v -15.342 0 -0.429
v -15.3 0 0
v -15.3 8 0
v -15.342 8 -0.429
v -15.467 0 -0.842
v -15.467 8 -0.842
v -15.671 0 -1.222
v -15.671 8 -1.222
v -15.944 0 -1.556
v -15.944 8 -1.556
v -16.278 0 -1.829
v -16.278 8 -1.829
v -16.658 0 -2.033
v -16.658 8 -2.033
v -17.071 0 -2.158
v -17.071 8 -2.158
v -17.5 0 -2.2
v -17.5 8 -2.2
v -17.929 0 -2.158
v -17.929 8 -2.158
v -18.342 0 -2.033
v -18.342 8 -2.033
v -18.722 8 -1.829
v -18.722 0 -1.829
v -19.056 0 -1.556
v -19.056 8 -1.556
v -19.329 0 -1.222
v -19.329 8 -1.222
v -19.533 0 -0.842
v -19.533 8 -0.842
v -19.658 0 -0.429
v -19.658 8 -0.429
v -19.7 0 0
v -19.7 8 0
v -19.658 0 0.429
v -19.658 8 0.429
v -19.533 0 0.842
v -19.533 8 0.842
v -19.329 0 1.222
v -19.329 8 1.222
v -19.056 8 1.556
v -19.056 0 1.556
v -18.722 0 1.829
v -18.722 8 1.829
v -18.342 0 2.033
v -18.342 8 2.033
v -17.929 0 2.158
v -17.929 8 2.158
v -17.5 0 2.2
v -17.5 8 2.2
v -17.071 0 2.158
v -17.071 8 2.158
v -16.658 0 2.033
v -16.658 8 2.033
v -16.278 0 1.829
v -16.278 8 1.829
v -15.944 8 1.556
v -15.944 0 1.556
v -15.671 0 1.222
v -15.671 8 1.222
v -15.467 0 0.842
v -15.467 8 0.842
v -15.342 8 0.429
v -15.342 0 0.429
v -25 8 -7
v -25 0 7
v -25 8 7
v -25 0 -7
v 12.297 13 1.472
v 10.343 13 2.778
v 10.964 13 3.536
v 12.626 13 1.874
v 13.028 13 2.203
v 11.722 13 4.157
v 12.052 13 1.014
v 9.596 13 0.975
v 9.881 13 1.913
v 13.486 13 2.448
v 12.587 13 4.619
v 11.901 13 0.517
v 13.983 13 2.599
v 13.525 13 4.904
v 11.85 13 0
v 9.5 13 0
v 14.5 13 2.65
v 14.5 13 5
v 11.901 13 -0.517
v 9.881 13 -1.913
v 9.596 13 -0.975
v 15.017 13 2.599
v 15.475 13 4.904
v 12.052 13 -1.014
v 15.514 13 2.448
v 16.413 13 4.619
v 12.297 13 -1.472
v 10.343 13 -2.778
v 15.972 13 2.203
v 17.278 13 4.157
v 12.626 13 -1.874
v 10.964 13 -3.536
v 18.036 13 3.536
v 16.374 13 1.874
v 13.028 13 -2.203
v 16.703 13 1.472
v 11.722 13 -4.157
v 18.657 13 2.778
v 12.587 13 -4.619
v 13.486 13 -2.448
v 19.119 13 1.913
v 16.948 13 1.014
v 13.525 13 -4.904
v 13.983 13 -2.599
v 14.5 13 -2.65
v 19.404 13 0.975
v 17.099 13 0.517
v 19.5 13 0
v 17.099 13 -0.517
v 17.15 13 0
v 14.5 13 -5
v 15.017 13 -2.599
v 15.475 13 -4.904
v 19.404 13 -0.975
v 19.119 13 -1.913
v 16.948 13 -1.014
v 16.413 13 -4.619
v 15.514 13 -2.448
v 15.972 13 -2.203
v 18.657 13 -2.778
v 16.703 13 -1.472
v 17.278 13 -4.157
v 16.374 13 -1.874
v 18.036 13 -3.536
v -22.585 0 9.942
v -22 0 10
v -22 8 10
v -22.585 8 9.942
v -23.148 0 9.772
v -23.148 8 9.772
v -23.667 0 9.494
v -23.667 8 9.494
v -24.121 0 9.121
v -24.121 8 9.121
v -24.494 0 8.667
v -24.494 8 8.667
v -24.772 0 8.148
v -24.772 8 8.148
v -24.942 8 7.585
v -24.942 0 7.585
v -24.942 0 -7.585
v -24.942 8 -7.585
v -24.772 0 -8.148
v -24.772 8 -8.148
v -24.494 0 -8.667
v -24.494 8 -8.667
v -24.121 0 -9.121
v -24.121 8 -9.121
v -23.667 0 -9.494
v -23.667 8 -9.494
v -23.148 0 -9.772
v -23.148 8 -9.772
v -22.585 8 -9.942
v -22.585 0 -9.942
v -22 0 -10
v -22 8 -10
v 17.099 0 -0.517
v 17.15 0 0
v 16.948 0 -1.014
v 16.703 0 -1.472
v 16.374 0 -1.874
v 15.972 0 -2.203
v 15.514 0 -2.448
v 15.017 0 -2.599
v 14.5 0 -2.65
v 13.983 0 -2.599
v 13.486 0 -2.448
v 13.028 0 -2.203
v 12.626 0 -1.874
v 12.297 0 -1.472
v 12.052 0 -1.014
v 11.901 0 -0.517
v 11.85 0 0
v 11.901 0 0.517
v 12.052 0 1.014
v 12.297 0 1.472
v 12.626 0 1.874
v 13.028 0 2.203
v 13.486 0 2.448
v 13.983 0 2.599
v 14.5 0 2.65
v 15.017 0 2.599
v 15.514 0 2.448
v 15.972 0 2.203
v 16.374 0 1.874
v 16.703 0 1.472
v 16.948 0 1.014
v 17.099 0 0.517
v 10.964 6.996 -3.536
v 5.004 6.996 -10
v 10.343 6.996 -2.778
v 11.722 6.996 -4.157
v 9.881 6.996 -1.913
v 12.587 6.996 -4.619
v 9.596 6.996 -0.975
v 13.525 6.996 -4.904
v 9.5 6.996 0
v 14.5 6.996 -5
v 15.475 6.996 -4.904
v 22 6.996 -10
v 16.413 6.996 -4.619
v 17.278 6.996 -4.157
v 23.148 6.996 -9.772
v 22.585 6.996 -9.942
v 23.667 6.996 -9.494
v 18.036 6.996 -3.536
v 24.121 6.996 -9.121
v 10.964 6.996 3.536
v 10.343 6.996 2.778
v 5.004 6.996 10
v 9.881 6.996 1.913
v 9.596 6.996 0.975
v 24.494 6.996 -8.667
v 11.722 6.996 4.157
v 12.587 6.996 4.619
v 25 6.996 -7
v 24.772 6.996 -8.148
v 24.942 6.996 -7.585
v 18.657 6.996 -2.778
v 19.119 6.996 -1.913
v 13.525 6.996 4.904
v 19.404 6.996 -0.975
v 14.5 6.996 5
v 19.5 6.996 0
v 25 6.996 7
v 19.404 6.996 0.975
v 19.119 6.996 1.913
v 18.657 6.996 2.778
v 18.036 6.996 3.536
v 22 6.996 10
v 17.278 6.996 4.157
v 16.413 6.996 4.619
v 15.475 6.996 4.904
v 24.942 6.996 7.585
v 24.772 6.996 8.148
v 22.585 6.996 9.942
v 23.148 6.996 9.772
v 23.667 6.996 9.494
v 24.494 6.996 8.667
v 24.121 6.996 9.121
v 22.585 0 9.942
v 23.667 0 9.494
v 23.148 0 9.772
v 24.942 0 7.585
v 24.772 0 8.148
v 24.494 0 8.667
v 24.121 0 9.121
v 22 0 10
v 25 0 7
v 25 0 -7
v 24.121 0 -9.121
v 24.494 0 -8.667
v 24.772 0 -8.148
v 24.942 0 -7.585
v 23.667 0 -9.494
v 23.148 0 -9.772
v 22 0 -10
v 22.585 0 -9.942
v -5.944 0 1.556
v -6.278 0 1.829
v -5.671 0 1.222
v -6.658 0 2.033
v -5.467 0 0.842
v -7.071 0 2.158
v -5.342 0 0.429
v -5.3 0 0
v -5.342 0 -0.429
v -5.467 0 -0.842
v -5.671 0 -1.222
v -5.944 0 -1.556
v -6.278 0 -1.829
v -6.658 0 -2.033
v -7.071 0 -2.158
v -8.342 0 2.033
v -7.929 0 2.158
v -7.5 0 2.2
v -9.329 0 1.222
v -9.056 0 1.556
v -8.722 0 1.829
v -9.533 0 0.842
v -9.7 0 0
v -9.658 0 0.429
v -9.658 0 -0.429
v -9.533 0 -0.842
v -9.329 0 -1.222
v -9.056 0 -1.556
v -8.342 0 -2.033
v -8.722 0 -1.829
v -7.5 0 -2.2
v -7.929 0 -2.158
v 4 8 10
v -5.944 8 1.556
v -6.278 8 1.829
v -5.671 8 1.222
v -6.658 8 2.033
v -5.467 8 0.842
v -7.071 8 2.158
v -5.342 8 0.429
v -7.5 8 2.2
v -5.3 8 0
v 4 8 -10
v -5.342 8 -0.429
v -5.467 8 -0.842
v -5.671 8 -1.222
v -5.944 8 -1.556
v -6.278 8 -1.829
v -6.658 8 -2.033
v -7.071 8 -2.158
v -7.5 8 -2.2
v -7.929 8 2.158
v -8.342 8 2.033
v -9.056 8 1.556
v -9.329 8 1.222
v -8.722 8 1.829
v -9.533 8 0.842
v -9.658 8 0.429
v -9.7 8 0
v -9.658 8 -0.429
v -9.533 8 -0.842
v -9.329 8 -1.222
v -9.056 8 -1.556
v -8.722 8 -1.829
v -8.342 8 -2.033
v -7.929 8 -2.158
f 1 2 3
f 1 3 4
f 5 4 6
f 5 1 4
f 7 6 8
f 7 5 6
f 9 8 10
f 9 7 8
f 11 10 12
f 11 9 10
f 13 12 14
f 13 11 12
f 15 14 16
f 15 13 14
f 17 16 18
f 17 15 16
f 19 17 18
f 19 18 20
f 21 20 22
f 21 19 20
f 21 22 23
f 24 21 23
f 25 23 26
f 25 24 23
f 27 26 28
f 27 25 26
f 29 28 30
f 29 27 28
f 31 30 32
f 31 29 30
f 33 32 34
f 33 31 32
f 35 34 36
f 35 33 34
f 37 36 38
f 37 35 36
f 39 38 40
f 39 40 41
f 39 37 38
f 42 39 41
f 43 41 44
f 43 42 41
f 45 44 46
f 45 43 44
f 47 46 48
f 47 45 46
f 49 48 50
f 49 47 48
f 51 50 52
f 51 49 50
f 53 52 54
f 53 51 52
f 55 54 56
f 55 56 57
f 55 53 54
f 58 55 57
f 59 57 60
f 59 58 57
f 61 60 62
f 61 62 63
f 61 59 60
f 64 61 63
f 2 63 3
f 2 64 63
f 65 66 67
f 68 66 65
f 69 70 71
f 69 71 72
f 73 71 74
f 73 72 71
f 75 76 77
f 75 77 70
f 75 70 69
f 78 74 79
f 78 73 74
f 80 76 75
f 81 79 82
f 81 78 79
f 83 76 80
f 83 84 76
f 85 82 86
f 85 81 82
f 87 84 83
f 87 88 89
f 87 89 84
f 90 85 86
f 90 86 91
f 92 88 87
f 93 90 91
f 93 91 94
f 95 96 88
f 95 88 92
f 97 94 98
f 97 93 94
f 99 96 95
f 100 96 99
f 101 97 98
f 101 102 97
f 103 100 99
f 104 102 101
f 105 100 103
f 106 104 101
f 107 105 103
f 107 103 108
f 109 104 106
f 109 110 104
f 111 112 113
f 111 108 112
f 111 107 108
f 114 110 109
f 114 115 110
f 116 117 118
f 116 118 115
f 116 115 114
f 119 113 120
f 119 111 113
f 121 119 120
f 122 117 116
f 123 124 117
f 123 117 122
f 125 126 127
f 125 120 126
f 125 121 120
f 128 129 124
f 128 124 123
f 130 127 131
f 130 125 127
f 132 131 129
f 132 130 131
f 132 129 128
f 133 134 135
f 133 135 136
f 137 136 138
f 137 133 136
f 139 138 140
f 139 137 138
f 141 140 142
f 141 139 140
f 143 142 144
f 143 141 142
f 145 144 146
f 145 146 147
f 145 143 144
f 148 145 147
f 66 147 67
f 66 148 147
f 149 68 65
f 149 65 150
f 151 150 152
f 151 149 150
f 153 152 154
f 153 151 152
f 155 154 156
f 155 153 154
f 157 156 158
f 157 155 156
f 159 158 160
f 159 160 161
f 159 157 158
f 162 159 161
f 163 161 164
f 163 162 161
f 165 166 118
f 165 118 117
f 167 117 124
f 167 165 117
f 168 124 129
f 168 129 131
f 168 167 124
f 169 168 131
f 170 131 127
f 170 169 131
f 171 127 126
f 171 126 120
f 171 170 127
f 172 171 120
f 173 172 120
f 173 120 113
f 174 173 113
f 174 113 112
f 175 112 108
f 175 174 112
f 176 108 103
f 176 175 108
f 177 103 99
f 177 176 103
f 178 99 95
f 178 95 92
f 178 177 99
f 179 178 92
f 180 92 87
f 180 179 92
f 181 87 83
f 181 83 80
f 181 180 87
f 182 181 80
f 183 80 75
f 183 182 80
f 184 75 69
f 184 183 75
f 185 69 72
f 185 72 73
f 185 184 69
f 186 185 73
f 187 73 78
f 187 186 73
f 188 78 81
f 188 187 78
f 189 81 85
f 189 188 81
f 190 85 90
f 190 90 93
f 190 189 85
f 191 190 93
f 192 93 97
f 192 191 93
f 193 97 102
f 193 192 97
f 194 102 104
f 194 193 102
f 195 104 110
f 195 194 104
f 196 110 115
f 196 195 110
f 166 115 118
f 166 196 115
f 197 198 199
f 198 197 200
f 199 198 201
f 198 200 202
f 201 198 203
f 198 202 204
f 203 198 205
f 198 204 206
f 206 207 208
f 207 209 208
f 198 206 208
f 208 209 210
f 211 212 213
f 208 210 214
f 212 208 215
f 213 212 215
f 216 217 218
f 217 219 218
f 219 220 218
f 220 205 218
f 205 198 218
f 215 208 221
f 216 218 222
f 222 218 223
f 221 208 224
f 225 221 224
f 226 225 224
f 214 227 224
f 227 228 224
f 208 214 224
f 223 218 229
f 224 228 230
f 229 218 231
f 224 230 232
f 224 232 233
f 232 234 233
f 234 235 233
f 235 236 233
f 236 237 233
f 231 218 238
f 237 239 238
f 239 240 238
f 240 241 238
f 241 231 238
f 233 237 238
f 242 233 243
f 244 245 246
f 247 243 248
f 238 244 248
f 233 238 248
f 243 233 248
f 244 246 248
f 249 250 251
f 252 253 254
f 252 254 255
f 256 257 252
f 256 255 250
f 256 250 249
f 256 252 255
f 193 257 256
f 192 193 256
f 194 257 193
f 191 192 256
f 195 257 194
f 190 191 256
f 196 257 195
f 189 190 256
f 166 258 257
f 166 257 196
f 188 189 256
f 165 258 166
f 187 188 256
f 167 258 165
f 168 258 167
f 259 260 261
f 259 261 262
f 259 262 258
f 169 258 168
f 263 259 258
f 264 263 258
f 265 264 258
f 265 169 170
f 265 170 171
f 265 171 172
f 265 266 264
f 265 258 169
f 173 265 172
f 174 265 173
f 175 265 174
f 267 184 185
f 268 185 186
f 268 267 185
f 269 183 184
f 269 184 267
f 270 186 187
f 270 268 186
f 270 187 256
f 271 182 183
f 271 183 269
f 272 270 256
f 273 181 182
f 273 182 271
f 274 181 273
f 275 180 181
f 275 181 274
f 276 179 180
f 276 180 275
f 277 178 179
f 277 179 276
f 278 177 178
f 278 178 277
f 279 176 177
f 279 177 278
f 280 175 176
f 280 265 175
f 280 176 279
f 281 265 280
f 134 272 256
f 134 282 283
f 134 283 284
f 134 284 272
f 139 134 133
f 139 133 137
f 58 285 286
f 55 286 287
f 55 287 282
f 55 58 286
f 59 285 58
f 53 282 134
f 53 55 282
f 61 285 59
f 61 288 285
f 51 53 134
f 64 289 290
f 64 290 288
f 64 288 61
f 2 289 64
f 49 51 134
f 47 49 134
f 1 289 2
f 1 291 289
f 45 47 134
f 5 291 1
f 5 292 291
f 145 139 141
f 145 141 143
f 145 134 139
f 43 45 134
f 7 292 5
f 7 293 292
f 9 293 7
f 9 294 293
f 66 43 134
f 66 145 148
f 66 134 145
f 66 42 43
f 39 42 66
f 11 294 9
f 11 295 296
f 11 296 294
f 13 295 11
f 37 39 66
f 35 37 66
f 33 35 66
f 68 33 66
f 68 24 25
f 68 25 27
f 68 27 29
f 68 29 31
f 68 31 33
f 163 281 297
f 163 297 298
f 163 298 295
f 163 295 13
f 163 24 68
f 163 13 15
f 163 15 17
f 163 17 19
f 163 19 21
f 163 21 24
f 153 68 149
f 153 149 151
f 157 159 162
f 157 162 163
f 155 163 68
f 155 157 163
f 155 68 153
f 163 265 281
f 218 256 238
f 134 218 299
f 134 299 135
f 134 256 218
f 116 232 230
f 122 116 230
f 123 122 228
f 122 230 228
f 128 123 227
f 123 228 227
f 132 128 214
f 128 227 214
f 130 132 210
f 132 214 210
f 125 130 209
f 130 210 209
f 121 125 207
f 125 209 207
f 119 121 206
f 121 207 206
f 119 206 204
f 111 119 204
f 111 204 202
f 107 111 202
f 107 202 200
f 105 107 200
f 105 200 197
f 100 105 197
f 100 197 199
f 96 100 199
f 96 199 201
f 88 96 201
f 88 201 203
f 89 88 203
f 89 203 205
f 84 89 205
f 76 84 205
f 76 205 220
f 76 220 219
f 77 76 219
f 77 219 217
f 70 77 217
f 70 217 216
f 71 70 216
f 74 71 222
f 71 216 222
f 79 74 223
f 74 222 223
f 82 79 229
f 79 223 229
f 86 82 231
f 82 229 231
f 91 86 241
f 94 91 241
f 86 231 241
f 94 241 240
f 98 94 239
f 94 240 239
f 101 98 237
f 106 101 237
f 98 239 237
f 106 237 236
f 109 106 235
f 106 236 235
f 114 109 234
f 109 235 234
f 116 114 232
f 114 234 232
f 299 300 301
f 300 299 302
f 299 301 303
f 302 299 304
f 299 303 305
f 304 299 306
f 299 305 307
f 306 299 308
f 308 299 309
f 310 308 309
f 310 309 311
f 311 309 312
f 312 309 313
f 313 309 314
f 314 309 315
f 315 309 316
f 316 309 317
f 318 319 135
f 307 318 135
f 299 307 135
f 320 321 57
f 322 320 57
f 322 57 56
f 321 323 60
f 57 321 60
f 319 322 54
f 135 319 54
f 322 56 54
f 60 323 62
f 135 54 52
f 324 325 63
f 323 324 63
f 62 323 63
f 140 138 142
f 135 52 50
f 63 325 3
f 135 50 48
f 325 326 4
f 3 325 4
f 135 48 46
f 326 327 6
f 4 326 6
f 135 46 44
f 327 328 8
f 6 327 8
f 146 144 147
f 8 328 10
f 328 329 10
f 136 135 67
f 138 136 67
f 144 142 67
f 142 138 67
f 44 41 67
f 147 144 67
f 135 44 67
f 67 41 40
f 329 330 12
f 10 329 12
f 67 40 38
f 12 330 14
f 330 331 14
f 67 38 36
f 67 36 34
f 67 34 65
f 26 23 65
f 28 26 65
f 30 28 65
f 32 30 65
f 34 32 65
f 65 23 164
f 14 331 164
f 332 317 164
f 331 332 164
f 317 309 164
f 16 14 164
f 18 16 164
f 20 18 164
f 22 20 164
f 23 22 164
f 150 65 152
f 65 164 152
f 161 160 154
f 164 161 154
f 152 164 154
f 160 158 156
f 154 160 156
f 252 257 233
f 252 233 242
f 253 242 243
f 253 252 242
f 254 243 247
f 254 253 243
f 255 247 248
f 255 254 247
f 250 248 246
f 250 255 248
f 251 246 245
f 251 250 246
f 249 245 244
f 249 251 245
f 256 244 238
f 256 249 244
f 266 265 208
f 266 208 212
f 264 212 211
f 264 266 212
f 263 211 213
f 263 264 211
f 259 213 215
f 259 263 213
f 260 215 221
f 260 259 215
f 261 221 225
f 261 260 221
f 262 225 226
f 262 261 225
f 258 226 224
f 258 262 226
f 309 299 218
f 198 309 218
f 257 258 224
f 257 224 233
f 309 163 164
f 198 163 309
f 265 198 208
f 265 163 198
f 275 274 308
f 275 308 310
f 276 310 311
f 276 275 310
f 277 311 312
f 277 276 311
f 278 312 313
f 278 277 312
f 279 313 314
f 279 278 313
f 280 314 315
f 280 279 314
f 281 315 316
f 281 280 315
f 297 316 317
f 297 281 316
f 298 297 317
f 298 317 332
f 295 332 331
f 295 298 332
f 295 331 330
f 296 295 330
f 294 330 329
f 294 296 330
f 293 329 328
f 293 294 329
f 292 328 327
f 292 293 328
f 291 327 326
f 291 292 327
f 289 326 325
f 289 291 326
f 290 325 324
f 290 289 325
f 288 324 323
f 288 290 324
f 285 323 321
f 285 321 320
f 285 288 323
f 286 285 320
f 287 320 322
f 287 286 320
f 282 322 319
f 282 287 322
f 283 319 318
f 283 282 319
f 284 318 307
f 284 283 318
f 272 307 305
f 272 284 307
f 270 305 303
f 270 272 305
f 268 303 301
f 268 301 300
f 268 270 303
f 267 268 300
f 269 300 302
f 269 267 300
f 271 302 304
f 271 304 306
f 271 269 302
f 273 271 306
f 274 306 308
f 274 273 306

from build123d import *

# Parameters (mm, degrees)
CROQUIS1_R              = 2.2
CROQUIS1_R_2            = 5
SALIENTE_EXTRUIR1_DEPTH = 8
CORTAR_EXTRUIR1_DEPTH   = 26
CROQUIS1_3_R            = 5
CROQUIS1_3_R_2          = 2.65
SALIENTE_EXTRUIR2_DEPTH = 13


with BuildPart() as part:
    # Croquis1 → Saliente-Extruir1 (new body)
    with BuildSketch(Plane(origin=(0, 0, 0), x_dir=(1, 0, 0), z_dir=(0, 1, 0))):
        with BuildLine():
            ThreePointArc((-25, -7), (-24.121320344, -9.121320344), (-22, -10))
            Line((-22, -10), (22, -10))
            ThreePointArc((22, -10), (24.121320344, -9.121320344), (25, -7))
            Line((25, -7), (25, 7))
            ThreePointArc((25, 7), (24.121320344, 9.121320344), (22, 10))
            Line((22, 10), (-22, 10))
            ThreePointArc((-22, 10), (-24.121320344, 9.121320344), (-25, 7))
            Line((-25, 7), (-25, -7))
        make_face()
        with Locations((-17.5, 0)):
            Circle(CROQUIS1_R, mode=Mode.SUBTRACT)
        with Locations((-7.5, 0)):
            Circle(CROQUIS1_R, mode=Mode.SUBTRACT)
        with Locations((14.5, 0)):
            Circle(CROQUIS1_R_2, mode=Mode.SUBTRACT)
    extrude(amount=SALIENTE_EXTRUIR1_DEPTH)

    # Croquis2 → Cortar-Extruir1 (cut)
    with BuildSketch(Plane.XY.offset(10)):
        Polygon((4, 8), (5.004091629, 6.995908371), (27.295002856, 6.995908371), (27.295002856, 8), align=None)
    extrude(amount=-CORTAR_EXTRUIR1_DEPTH, mode=Mode.SUBTRACT)

    # Croquis1<3> → Saliente-Extruir2 (add)
    with BuildSketch(Plane(origin=(0, 0, 0), x_dir=(1, 0, 0), z_dir=(0, 1, 0))):
        with Locations((14.5, 0)):
            Circle(CROQUIS1_3_R)
        with Locations((14.5, 0)):
            Circle(CROQUIS1_3_R_2, mode=Mode.SUBTRACT)
    extrude(amount=SALIENTE_EXTRUIR2_DEPTH)


solid = part.part
